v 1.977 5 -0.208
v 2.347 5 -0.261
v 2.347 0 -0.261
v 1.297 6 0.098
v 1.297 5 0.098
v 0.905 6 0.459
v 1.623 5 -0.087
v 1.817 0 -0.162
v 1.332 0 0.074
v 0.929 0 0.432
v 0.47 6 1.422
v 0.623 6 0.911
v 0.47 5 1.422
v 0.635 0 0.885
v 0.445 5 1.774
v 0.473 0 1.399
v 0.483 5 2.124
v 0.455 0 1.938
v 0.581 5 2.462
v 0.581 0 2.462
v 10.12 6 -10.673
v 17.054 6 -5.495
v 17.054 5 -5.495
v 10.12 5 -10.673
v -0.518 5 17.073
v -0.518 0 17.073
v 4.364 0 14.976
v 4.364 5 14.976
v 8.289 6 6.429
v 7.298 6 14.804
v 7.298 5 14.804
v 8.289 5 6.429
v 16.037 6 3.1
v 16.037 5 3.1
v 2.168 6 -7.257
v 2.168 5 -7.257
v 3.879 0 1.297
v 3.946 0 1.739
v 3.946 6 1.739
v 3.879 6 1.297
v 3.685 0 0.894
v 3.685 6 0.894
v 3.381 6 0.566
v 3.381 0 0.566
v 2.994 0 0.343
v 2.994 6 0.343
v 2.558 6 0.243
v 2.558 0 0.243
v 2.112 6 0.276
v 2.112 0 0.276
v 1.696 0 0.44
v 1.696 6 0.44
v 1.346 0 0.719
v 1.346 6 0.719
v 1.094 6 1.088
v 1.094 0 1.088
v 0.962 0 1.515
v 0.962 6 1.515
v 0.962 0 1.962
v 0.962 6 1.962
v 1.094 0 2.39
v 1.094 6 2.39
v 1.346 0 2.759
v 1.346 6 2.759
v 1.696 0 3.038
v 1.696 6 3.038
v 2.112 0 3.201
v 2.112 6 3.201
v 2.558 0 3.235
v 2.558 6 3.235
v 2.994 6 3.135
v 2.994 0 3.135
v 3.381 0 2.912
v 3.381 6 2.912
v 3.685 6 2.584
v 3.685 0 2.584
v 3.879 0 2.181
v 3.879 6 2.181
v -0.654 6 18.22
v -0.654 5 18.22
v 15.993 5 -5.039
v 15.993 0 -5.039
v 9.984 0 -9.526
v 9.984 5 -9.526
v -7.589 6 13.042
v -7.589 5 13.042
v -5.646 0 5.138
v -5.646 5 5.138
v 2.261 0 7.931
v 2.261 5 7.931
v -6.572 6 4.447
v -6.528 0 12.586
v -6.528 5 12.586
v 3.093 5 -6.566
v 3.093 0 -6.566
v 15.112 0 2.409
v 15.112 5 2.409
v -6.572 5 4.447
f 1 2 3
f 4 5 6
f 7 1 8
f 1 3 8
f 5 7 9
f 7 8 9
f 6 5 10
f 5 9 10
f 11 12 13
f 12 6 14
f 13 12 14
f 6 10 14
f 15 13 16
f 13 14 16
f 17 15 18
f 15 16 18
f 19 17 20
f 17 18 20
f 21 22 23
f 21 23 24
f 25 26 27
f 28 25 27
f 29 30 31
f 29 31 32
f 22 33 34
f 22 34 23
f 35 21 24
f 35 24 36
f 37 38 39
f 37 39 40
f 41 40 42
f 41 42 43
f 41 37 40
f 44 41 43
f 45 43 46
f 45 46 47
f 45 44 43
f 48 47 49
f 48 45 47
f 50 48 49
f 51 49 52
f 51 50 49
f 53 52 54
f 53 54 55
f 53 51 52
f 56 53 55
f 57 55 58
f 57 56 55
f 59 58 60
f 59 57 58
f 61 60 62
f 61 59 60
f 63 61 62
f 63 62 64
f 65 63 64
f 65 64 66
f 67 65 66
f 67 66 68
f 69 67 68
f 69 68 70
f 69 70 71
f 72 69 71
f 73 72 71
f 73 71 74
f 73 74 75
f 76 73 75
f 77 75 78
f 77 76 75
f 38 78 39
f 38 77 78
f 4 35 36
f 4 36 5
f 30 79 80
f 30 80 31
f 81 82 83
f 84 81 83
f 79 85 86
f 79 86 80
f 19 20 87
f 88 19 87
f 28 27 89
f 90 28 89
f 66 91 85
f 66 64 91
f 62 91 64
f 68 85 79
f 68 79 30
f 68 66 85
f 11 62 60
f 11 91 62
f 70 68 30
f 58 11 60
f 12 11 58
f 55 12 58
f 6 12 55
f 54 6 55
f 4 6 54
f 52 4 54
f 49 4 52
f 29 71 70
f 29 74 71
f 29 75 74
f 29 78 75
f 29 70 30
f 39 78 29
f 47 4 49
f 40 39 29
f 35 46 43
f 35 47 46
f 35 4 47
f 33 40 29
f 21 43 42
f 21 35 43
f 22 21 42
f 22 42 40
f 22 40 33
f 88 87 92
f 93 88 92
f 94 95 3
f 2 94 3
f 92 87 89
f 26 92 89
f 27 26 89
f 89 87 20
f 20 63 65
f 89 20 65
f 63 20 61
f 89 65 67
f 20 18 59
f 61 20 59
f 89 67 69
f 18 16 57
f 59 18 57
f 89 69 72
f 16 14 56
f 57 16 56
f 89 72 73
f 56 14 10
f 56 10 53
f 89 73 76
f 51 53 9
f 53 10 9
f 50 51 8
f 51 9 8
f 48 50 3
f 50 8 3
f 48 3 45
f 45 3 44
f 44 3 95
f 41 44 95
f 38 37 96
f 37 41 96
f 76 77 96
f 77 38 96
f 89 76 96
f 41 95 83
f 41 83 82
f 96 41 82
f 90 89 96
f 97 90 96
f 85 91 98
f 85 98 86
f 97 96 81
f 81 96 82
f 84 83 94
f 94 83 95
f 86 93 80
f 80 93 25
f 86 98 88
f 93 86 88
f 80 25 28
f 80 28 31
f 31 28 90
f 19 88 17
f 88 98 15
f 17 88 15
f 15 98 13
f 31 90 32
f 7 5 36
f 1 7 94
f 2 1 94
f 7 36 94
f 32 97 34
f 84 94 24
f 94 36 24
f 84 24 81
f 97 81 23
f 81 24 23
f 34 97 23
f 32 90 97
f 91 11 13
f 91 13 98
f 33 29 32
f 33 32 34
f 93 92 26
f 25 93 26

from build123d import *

# Parameters (mm, degrees)
SKETCH1_R           = 1.5
BOSS_EXTRUDE1_DEPTH = 6
BOSS_EXTRUDE2_DEPTH = 1


with BuildPart() as part:
    # Sketch1 → Boss-Extrude1 (new body)
    with BuildSketch(Plane(origin=(0, 0, 0), x_dir=(1, 0, 0), z_dir=(0, 1, 0))):
        with BuildLine():
            ThreePointArc((2.346955398, 0.261158526), (0.766582759, -0.648437779), (0.581159215, -2.462428195))
            Line((0.581159215, -2.462428195), (-5.646281291, -5.138082195))
            Line((-5.646281291, -5.138082195), (-6.527676066, -12.586111683))
            Line((-6.527676066, -12.586111683), (-0.518190709, -17.073436693))
            Line((-0.518190709, -17.073436693), (4.364038924, -14.975759929))
            Line((4.364038924, -14.975759929), (2.260805866, -7.930513525))
            Line((2.260805866, -7.930513525), (15.112004176, -2.408925622))
            Line((15.112004176, -2.408925622), (15.993398951, 5.039103866))
            Line((15.993398951, 5.039103866), (9.983913594, 9.526428876))
            Line((9.983913594, 9.526428876), (3.093033462, 6.565724398))
            Line((3.093033462, 6.565724398), (2.346955398, 0.261158526))
        make_face()
        with Locations((2.445675843, -1.738841474)):
            Circle(SKETCH1_R, mode=Mode.SUBTRACT)
    extrude(amount=BOSS_EXTRUDE1_DEPTH)

    # Sketch2 → Boss-Extrude2 (add)
    with BuildSketch(Plane(origin=(0, 6, 0), x_dir=(1, 0, 0), z_dir=(0, 1, 0))):
        with BuildLine():
            Line((0.469627416, -1.421953369), (-6.571502088, -4.447213314))
            Line((-6.571502088, -4.447213314), (-7.588596466, -13.041941957))
            Line((-7.588596466, -13.041941957), (-0.653890312, -18.220135847))
            Line((-0.653890312, -18.220135847), (7.29791022, -14.803601096))
            Line((7.29791022, -14.803601096), (8.288969653, -6.428874937))
            Line((8.288969653, -6.428874937), (16.037224973, -3.099794503))
            Line((16.037224973, -3.099794503), (17.054319351, 5.494934139))
            Line((17.054319351, 5.494934139), (10.119613197, 10.67312803))
            Line((10.119613197, 10.67312803), (2.167812665, 7.256593278))
            Line((2.167812665, 7.256593278), (1.297445688, -0.098248268))
            ThreePointArc((1.297445688, -0.098248268), (1.796782906, 0.15567759), (2.346955398, 0.261158526))
            Line((2.346955398, 0.261158526), (3.093033462, 6.565724398))
            Line((3.093033462, 6.565724398), (9.983913594, 9.526428876))
            Line((9.983913594, 9.526428876), (15.993398951, 5.039103866))
            Line((15.993398951, 5.039103866), (15.112004176, -2.408925622))
            Line((15.112004176, -2.408925622), (2.260805866, -7.930513525))
            Line((2.260805866, -7.930513525), (4.364038924, -14.975759929))
            Line((4.364038924, -14.975759929), (-0.518190709, -17.073436693))
            Line((-0.518190709, -17.073436693), (-6.527676066, -12.586111683))
            Line((-6.527676066, -12.586111683), (-5.646281291, -5.138082195))
            Line((-5.646281291, -5.138082195), (0.581159215, -2.462428195))
            ThreePointArc((0.581159215, -2.462428195), (0.456138011, -1.949614478), (0.469627416, -1.421953369))
        make_face()
    extrude(amount=-BOSS_EXTRUDE2_DEPTH)


solid = part.part
